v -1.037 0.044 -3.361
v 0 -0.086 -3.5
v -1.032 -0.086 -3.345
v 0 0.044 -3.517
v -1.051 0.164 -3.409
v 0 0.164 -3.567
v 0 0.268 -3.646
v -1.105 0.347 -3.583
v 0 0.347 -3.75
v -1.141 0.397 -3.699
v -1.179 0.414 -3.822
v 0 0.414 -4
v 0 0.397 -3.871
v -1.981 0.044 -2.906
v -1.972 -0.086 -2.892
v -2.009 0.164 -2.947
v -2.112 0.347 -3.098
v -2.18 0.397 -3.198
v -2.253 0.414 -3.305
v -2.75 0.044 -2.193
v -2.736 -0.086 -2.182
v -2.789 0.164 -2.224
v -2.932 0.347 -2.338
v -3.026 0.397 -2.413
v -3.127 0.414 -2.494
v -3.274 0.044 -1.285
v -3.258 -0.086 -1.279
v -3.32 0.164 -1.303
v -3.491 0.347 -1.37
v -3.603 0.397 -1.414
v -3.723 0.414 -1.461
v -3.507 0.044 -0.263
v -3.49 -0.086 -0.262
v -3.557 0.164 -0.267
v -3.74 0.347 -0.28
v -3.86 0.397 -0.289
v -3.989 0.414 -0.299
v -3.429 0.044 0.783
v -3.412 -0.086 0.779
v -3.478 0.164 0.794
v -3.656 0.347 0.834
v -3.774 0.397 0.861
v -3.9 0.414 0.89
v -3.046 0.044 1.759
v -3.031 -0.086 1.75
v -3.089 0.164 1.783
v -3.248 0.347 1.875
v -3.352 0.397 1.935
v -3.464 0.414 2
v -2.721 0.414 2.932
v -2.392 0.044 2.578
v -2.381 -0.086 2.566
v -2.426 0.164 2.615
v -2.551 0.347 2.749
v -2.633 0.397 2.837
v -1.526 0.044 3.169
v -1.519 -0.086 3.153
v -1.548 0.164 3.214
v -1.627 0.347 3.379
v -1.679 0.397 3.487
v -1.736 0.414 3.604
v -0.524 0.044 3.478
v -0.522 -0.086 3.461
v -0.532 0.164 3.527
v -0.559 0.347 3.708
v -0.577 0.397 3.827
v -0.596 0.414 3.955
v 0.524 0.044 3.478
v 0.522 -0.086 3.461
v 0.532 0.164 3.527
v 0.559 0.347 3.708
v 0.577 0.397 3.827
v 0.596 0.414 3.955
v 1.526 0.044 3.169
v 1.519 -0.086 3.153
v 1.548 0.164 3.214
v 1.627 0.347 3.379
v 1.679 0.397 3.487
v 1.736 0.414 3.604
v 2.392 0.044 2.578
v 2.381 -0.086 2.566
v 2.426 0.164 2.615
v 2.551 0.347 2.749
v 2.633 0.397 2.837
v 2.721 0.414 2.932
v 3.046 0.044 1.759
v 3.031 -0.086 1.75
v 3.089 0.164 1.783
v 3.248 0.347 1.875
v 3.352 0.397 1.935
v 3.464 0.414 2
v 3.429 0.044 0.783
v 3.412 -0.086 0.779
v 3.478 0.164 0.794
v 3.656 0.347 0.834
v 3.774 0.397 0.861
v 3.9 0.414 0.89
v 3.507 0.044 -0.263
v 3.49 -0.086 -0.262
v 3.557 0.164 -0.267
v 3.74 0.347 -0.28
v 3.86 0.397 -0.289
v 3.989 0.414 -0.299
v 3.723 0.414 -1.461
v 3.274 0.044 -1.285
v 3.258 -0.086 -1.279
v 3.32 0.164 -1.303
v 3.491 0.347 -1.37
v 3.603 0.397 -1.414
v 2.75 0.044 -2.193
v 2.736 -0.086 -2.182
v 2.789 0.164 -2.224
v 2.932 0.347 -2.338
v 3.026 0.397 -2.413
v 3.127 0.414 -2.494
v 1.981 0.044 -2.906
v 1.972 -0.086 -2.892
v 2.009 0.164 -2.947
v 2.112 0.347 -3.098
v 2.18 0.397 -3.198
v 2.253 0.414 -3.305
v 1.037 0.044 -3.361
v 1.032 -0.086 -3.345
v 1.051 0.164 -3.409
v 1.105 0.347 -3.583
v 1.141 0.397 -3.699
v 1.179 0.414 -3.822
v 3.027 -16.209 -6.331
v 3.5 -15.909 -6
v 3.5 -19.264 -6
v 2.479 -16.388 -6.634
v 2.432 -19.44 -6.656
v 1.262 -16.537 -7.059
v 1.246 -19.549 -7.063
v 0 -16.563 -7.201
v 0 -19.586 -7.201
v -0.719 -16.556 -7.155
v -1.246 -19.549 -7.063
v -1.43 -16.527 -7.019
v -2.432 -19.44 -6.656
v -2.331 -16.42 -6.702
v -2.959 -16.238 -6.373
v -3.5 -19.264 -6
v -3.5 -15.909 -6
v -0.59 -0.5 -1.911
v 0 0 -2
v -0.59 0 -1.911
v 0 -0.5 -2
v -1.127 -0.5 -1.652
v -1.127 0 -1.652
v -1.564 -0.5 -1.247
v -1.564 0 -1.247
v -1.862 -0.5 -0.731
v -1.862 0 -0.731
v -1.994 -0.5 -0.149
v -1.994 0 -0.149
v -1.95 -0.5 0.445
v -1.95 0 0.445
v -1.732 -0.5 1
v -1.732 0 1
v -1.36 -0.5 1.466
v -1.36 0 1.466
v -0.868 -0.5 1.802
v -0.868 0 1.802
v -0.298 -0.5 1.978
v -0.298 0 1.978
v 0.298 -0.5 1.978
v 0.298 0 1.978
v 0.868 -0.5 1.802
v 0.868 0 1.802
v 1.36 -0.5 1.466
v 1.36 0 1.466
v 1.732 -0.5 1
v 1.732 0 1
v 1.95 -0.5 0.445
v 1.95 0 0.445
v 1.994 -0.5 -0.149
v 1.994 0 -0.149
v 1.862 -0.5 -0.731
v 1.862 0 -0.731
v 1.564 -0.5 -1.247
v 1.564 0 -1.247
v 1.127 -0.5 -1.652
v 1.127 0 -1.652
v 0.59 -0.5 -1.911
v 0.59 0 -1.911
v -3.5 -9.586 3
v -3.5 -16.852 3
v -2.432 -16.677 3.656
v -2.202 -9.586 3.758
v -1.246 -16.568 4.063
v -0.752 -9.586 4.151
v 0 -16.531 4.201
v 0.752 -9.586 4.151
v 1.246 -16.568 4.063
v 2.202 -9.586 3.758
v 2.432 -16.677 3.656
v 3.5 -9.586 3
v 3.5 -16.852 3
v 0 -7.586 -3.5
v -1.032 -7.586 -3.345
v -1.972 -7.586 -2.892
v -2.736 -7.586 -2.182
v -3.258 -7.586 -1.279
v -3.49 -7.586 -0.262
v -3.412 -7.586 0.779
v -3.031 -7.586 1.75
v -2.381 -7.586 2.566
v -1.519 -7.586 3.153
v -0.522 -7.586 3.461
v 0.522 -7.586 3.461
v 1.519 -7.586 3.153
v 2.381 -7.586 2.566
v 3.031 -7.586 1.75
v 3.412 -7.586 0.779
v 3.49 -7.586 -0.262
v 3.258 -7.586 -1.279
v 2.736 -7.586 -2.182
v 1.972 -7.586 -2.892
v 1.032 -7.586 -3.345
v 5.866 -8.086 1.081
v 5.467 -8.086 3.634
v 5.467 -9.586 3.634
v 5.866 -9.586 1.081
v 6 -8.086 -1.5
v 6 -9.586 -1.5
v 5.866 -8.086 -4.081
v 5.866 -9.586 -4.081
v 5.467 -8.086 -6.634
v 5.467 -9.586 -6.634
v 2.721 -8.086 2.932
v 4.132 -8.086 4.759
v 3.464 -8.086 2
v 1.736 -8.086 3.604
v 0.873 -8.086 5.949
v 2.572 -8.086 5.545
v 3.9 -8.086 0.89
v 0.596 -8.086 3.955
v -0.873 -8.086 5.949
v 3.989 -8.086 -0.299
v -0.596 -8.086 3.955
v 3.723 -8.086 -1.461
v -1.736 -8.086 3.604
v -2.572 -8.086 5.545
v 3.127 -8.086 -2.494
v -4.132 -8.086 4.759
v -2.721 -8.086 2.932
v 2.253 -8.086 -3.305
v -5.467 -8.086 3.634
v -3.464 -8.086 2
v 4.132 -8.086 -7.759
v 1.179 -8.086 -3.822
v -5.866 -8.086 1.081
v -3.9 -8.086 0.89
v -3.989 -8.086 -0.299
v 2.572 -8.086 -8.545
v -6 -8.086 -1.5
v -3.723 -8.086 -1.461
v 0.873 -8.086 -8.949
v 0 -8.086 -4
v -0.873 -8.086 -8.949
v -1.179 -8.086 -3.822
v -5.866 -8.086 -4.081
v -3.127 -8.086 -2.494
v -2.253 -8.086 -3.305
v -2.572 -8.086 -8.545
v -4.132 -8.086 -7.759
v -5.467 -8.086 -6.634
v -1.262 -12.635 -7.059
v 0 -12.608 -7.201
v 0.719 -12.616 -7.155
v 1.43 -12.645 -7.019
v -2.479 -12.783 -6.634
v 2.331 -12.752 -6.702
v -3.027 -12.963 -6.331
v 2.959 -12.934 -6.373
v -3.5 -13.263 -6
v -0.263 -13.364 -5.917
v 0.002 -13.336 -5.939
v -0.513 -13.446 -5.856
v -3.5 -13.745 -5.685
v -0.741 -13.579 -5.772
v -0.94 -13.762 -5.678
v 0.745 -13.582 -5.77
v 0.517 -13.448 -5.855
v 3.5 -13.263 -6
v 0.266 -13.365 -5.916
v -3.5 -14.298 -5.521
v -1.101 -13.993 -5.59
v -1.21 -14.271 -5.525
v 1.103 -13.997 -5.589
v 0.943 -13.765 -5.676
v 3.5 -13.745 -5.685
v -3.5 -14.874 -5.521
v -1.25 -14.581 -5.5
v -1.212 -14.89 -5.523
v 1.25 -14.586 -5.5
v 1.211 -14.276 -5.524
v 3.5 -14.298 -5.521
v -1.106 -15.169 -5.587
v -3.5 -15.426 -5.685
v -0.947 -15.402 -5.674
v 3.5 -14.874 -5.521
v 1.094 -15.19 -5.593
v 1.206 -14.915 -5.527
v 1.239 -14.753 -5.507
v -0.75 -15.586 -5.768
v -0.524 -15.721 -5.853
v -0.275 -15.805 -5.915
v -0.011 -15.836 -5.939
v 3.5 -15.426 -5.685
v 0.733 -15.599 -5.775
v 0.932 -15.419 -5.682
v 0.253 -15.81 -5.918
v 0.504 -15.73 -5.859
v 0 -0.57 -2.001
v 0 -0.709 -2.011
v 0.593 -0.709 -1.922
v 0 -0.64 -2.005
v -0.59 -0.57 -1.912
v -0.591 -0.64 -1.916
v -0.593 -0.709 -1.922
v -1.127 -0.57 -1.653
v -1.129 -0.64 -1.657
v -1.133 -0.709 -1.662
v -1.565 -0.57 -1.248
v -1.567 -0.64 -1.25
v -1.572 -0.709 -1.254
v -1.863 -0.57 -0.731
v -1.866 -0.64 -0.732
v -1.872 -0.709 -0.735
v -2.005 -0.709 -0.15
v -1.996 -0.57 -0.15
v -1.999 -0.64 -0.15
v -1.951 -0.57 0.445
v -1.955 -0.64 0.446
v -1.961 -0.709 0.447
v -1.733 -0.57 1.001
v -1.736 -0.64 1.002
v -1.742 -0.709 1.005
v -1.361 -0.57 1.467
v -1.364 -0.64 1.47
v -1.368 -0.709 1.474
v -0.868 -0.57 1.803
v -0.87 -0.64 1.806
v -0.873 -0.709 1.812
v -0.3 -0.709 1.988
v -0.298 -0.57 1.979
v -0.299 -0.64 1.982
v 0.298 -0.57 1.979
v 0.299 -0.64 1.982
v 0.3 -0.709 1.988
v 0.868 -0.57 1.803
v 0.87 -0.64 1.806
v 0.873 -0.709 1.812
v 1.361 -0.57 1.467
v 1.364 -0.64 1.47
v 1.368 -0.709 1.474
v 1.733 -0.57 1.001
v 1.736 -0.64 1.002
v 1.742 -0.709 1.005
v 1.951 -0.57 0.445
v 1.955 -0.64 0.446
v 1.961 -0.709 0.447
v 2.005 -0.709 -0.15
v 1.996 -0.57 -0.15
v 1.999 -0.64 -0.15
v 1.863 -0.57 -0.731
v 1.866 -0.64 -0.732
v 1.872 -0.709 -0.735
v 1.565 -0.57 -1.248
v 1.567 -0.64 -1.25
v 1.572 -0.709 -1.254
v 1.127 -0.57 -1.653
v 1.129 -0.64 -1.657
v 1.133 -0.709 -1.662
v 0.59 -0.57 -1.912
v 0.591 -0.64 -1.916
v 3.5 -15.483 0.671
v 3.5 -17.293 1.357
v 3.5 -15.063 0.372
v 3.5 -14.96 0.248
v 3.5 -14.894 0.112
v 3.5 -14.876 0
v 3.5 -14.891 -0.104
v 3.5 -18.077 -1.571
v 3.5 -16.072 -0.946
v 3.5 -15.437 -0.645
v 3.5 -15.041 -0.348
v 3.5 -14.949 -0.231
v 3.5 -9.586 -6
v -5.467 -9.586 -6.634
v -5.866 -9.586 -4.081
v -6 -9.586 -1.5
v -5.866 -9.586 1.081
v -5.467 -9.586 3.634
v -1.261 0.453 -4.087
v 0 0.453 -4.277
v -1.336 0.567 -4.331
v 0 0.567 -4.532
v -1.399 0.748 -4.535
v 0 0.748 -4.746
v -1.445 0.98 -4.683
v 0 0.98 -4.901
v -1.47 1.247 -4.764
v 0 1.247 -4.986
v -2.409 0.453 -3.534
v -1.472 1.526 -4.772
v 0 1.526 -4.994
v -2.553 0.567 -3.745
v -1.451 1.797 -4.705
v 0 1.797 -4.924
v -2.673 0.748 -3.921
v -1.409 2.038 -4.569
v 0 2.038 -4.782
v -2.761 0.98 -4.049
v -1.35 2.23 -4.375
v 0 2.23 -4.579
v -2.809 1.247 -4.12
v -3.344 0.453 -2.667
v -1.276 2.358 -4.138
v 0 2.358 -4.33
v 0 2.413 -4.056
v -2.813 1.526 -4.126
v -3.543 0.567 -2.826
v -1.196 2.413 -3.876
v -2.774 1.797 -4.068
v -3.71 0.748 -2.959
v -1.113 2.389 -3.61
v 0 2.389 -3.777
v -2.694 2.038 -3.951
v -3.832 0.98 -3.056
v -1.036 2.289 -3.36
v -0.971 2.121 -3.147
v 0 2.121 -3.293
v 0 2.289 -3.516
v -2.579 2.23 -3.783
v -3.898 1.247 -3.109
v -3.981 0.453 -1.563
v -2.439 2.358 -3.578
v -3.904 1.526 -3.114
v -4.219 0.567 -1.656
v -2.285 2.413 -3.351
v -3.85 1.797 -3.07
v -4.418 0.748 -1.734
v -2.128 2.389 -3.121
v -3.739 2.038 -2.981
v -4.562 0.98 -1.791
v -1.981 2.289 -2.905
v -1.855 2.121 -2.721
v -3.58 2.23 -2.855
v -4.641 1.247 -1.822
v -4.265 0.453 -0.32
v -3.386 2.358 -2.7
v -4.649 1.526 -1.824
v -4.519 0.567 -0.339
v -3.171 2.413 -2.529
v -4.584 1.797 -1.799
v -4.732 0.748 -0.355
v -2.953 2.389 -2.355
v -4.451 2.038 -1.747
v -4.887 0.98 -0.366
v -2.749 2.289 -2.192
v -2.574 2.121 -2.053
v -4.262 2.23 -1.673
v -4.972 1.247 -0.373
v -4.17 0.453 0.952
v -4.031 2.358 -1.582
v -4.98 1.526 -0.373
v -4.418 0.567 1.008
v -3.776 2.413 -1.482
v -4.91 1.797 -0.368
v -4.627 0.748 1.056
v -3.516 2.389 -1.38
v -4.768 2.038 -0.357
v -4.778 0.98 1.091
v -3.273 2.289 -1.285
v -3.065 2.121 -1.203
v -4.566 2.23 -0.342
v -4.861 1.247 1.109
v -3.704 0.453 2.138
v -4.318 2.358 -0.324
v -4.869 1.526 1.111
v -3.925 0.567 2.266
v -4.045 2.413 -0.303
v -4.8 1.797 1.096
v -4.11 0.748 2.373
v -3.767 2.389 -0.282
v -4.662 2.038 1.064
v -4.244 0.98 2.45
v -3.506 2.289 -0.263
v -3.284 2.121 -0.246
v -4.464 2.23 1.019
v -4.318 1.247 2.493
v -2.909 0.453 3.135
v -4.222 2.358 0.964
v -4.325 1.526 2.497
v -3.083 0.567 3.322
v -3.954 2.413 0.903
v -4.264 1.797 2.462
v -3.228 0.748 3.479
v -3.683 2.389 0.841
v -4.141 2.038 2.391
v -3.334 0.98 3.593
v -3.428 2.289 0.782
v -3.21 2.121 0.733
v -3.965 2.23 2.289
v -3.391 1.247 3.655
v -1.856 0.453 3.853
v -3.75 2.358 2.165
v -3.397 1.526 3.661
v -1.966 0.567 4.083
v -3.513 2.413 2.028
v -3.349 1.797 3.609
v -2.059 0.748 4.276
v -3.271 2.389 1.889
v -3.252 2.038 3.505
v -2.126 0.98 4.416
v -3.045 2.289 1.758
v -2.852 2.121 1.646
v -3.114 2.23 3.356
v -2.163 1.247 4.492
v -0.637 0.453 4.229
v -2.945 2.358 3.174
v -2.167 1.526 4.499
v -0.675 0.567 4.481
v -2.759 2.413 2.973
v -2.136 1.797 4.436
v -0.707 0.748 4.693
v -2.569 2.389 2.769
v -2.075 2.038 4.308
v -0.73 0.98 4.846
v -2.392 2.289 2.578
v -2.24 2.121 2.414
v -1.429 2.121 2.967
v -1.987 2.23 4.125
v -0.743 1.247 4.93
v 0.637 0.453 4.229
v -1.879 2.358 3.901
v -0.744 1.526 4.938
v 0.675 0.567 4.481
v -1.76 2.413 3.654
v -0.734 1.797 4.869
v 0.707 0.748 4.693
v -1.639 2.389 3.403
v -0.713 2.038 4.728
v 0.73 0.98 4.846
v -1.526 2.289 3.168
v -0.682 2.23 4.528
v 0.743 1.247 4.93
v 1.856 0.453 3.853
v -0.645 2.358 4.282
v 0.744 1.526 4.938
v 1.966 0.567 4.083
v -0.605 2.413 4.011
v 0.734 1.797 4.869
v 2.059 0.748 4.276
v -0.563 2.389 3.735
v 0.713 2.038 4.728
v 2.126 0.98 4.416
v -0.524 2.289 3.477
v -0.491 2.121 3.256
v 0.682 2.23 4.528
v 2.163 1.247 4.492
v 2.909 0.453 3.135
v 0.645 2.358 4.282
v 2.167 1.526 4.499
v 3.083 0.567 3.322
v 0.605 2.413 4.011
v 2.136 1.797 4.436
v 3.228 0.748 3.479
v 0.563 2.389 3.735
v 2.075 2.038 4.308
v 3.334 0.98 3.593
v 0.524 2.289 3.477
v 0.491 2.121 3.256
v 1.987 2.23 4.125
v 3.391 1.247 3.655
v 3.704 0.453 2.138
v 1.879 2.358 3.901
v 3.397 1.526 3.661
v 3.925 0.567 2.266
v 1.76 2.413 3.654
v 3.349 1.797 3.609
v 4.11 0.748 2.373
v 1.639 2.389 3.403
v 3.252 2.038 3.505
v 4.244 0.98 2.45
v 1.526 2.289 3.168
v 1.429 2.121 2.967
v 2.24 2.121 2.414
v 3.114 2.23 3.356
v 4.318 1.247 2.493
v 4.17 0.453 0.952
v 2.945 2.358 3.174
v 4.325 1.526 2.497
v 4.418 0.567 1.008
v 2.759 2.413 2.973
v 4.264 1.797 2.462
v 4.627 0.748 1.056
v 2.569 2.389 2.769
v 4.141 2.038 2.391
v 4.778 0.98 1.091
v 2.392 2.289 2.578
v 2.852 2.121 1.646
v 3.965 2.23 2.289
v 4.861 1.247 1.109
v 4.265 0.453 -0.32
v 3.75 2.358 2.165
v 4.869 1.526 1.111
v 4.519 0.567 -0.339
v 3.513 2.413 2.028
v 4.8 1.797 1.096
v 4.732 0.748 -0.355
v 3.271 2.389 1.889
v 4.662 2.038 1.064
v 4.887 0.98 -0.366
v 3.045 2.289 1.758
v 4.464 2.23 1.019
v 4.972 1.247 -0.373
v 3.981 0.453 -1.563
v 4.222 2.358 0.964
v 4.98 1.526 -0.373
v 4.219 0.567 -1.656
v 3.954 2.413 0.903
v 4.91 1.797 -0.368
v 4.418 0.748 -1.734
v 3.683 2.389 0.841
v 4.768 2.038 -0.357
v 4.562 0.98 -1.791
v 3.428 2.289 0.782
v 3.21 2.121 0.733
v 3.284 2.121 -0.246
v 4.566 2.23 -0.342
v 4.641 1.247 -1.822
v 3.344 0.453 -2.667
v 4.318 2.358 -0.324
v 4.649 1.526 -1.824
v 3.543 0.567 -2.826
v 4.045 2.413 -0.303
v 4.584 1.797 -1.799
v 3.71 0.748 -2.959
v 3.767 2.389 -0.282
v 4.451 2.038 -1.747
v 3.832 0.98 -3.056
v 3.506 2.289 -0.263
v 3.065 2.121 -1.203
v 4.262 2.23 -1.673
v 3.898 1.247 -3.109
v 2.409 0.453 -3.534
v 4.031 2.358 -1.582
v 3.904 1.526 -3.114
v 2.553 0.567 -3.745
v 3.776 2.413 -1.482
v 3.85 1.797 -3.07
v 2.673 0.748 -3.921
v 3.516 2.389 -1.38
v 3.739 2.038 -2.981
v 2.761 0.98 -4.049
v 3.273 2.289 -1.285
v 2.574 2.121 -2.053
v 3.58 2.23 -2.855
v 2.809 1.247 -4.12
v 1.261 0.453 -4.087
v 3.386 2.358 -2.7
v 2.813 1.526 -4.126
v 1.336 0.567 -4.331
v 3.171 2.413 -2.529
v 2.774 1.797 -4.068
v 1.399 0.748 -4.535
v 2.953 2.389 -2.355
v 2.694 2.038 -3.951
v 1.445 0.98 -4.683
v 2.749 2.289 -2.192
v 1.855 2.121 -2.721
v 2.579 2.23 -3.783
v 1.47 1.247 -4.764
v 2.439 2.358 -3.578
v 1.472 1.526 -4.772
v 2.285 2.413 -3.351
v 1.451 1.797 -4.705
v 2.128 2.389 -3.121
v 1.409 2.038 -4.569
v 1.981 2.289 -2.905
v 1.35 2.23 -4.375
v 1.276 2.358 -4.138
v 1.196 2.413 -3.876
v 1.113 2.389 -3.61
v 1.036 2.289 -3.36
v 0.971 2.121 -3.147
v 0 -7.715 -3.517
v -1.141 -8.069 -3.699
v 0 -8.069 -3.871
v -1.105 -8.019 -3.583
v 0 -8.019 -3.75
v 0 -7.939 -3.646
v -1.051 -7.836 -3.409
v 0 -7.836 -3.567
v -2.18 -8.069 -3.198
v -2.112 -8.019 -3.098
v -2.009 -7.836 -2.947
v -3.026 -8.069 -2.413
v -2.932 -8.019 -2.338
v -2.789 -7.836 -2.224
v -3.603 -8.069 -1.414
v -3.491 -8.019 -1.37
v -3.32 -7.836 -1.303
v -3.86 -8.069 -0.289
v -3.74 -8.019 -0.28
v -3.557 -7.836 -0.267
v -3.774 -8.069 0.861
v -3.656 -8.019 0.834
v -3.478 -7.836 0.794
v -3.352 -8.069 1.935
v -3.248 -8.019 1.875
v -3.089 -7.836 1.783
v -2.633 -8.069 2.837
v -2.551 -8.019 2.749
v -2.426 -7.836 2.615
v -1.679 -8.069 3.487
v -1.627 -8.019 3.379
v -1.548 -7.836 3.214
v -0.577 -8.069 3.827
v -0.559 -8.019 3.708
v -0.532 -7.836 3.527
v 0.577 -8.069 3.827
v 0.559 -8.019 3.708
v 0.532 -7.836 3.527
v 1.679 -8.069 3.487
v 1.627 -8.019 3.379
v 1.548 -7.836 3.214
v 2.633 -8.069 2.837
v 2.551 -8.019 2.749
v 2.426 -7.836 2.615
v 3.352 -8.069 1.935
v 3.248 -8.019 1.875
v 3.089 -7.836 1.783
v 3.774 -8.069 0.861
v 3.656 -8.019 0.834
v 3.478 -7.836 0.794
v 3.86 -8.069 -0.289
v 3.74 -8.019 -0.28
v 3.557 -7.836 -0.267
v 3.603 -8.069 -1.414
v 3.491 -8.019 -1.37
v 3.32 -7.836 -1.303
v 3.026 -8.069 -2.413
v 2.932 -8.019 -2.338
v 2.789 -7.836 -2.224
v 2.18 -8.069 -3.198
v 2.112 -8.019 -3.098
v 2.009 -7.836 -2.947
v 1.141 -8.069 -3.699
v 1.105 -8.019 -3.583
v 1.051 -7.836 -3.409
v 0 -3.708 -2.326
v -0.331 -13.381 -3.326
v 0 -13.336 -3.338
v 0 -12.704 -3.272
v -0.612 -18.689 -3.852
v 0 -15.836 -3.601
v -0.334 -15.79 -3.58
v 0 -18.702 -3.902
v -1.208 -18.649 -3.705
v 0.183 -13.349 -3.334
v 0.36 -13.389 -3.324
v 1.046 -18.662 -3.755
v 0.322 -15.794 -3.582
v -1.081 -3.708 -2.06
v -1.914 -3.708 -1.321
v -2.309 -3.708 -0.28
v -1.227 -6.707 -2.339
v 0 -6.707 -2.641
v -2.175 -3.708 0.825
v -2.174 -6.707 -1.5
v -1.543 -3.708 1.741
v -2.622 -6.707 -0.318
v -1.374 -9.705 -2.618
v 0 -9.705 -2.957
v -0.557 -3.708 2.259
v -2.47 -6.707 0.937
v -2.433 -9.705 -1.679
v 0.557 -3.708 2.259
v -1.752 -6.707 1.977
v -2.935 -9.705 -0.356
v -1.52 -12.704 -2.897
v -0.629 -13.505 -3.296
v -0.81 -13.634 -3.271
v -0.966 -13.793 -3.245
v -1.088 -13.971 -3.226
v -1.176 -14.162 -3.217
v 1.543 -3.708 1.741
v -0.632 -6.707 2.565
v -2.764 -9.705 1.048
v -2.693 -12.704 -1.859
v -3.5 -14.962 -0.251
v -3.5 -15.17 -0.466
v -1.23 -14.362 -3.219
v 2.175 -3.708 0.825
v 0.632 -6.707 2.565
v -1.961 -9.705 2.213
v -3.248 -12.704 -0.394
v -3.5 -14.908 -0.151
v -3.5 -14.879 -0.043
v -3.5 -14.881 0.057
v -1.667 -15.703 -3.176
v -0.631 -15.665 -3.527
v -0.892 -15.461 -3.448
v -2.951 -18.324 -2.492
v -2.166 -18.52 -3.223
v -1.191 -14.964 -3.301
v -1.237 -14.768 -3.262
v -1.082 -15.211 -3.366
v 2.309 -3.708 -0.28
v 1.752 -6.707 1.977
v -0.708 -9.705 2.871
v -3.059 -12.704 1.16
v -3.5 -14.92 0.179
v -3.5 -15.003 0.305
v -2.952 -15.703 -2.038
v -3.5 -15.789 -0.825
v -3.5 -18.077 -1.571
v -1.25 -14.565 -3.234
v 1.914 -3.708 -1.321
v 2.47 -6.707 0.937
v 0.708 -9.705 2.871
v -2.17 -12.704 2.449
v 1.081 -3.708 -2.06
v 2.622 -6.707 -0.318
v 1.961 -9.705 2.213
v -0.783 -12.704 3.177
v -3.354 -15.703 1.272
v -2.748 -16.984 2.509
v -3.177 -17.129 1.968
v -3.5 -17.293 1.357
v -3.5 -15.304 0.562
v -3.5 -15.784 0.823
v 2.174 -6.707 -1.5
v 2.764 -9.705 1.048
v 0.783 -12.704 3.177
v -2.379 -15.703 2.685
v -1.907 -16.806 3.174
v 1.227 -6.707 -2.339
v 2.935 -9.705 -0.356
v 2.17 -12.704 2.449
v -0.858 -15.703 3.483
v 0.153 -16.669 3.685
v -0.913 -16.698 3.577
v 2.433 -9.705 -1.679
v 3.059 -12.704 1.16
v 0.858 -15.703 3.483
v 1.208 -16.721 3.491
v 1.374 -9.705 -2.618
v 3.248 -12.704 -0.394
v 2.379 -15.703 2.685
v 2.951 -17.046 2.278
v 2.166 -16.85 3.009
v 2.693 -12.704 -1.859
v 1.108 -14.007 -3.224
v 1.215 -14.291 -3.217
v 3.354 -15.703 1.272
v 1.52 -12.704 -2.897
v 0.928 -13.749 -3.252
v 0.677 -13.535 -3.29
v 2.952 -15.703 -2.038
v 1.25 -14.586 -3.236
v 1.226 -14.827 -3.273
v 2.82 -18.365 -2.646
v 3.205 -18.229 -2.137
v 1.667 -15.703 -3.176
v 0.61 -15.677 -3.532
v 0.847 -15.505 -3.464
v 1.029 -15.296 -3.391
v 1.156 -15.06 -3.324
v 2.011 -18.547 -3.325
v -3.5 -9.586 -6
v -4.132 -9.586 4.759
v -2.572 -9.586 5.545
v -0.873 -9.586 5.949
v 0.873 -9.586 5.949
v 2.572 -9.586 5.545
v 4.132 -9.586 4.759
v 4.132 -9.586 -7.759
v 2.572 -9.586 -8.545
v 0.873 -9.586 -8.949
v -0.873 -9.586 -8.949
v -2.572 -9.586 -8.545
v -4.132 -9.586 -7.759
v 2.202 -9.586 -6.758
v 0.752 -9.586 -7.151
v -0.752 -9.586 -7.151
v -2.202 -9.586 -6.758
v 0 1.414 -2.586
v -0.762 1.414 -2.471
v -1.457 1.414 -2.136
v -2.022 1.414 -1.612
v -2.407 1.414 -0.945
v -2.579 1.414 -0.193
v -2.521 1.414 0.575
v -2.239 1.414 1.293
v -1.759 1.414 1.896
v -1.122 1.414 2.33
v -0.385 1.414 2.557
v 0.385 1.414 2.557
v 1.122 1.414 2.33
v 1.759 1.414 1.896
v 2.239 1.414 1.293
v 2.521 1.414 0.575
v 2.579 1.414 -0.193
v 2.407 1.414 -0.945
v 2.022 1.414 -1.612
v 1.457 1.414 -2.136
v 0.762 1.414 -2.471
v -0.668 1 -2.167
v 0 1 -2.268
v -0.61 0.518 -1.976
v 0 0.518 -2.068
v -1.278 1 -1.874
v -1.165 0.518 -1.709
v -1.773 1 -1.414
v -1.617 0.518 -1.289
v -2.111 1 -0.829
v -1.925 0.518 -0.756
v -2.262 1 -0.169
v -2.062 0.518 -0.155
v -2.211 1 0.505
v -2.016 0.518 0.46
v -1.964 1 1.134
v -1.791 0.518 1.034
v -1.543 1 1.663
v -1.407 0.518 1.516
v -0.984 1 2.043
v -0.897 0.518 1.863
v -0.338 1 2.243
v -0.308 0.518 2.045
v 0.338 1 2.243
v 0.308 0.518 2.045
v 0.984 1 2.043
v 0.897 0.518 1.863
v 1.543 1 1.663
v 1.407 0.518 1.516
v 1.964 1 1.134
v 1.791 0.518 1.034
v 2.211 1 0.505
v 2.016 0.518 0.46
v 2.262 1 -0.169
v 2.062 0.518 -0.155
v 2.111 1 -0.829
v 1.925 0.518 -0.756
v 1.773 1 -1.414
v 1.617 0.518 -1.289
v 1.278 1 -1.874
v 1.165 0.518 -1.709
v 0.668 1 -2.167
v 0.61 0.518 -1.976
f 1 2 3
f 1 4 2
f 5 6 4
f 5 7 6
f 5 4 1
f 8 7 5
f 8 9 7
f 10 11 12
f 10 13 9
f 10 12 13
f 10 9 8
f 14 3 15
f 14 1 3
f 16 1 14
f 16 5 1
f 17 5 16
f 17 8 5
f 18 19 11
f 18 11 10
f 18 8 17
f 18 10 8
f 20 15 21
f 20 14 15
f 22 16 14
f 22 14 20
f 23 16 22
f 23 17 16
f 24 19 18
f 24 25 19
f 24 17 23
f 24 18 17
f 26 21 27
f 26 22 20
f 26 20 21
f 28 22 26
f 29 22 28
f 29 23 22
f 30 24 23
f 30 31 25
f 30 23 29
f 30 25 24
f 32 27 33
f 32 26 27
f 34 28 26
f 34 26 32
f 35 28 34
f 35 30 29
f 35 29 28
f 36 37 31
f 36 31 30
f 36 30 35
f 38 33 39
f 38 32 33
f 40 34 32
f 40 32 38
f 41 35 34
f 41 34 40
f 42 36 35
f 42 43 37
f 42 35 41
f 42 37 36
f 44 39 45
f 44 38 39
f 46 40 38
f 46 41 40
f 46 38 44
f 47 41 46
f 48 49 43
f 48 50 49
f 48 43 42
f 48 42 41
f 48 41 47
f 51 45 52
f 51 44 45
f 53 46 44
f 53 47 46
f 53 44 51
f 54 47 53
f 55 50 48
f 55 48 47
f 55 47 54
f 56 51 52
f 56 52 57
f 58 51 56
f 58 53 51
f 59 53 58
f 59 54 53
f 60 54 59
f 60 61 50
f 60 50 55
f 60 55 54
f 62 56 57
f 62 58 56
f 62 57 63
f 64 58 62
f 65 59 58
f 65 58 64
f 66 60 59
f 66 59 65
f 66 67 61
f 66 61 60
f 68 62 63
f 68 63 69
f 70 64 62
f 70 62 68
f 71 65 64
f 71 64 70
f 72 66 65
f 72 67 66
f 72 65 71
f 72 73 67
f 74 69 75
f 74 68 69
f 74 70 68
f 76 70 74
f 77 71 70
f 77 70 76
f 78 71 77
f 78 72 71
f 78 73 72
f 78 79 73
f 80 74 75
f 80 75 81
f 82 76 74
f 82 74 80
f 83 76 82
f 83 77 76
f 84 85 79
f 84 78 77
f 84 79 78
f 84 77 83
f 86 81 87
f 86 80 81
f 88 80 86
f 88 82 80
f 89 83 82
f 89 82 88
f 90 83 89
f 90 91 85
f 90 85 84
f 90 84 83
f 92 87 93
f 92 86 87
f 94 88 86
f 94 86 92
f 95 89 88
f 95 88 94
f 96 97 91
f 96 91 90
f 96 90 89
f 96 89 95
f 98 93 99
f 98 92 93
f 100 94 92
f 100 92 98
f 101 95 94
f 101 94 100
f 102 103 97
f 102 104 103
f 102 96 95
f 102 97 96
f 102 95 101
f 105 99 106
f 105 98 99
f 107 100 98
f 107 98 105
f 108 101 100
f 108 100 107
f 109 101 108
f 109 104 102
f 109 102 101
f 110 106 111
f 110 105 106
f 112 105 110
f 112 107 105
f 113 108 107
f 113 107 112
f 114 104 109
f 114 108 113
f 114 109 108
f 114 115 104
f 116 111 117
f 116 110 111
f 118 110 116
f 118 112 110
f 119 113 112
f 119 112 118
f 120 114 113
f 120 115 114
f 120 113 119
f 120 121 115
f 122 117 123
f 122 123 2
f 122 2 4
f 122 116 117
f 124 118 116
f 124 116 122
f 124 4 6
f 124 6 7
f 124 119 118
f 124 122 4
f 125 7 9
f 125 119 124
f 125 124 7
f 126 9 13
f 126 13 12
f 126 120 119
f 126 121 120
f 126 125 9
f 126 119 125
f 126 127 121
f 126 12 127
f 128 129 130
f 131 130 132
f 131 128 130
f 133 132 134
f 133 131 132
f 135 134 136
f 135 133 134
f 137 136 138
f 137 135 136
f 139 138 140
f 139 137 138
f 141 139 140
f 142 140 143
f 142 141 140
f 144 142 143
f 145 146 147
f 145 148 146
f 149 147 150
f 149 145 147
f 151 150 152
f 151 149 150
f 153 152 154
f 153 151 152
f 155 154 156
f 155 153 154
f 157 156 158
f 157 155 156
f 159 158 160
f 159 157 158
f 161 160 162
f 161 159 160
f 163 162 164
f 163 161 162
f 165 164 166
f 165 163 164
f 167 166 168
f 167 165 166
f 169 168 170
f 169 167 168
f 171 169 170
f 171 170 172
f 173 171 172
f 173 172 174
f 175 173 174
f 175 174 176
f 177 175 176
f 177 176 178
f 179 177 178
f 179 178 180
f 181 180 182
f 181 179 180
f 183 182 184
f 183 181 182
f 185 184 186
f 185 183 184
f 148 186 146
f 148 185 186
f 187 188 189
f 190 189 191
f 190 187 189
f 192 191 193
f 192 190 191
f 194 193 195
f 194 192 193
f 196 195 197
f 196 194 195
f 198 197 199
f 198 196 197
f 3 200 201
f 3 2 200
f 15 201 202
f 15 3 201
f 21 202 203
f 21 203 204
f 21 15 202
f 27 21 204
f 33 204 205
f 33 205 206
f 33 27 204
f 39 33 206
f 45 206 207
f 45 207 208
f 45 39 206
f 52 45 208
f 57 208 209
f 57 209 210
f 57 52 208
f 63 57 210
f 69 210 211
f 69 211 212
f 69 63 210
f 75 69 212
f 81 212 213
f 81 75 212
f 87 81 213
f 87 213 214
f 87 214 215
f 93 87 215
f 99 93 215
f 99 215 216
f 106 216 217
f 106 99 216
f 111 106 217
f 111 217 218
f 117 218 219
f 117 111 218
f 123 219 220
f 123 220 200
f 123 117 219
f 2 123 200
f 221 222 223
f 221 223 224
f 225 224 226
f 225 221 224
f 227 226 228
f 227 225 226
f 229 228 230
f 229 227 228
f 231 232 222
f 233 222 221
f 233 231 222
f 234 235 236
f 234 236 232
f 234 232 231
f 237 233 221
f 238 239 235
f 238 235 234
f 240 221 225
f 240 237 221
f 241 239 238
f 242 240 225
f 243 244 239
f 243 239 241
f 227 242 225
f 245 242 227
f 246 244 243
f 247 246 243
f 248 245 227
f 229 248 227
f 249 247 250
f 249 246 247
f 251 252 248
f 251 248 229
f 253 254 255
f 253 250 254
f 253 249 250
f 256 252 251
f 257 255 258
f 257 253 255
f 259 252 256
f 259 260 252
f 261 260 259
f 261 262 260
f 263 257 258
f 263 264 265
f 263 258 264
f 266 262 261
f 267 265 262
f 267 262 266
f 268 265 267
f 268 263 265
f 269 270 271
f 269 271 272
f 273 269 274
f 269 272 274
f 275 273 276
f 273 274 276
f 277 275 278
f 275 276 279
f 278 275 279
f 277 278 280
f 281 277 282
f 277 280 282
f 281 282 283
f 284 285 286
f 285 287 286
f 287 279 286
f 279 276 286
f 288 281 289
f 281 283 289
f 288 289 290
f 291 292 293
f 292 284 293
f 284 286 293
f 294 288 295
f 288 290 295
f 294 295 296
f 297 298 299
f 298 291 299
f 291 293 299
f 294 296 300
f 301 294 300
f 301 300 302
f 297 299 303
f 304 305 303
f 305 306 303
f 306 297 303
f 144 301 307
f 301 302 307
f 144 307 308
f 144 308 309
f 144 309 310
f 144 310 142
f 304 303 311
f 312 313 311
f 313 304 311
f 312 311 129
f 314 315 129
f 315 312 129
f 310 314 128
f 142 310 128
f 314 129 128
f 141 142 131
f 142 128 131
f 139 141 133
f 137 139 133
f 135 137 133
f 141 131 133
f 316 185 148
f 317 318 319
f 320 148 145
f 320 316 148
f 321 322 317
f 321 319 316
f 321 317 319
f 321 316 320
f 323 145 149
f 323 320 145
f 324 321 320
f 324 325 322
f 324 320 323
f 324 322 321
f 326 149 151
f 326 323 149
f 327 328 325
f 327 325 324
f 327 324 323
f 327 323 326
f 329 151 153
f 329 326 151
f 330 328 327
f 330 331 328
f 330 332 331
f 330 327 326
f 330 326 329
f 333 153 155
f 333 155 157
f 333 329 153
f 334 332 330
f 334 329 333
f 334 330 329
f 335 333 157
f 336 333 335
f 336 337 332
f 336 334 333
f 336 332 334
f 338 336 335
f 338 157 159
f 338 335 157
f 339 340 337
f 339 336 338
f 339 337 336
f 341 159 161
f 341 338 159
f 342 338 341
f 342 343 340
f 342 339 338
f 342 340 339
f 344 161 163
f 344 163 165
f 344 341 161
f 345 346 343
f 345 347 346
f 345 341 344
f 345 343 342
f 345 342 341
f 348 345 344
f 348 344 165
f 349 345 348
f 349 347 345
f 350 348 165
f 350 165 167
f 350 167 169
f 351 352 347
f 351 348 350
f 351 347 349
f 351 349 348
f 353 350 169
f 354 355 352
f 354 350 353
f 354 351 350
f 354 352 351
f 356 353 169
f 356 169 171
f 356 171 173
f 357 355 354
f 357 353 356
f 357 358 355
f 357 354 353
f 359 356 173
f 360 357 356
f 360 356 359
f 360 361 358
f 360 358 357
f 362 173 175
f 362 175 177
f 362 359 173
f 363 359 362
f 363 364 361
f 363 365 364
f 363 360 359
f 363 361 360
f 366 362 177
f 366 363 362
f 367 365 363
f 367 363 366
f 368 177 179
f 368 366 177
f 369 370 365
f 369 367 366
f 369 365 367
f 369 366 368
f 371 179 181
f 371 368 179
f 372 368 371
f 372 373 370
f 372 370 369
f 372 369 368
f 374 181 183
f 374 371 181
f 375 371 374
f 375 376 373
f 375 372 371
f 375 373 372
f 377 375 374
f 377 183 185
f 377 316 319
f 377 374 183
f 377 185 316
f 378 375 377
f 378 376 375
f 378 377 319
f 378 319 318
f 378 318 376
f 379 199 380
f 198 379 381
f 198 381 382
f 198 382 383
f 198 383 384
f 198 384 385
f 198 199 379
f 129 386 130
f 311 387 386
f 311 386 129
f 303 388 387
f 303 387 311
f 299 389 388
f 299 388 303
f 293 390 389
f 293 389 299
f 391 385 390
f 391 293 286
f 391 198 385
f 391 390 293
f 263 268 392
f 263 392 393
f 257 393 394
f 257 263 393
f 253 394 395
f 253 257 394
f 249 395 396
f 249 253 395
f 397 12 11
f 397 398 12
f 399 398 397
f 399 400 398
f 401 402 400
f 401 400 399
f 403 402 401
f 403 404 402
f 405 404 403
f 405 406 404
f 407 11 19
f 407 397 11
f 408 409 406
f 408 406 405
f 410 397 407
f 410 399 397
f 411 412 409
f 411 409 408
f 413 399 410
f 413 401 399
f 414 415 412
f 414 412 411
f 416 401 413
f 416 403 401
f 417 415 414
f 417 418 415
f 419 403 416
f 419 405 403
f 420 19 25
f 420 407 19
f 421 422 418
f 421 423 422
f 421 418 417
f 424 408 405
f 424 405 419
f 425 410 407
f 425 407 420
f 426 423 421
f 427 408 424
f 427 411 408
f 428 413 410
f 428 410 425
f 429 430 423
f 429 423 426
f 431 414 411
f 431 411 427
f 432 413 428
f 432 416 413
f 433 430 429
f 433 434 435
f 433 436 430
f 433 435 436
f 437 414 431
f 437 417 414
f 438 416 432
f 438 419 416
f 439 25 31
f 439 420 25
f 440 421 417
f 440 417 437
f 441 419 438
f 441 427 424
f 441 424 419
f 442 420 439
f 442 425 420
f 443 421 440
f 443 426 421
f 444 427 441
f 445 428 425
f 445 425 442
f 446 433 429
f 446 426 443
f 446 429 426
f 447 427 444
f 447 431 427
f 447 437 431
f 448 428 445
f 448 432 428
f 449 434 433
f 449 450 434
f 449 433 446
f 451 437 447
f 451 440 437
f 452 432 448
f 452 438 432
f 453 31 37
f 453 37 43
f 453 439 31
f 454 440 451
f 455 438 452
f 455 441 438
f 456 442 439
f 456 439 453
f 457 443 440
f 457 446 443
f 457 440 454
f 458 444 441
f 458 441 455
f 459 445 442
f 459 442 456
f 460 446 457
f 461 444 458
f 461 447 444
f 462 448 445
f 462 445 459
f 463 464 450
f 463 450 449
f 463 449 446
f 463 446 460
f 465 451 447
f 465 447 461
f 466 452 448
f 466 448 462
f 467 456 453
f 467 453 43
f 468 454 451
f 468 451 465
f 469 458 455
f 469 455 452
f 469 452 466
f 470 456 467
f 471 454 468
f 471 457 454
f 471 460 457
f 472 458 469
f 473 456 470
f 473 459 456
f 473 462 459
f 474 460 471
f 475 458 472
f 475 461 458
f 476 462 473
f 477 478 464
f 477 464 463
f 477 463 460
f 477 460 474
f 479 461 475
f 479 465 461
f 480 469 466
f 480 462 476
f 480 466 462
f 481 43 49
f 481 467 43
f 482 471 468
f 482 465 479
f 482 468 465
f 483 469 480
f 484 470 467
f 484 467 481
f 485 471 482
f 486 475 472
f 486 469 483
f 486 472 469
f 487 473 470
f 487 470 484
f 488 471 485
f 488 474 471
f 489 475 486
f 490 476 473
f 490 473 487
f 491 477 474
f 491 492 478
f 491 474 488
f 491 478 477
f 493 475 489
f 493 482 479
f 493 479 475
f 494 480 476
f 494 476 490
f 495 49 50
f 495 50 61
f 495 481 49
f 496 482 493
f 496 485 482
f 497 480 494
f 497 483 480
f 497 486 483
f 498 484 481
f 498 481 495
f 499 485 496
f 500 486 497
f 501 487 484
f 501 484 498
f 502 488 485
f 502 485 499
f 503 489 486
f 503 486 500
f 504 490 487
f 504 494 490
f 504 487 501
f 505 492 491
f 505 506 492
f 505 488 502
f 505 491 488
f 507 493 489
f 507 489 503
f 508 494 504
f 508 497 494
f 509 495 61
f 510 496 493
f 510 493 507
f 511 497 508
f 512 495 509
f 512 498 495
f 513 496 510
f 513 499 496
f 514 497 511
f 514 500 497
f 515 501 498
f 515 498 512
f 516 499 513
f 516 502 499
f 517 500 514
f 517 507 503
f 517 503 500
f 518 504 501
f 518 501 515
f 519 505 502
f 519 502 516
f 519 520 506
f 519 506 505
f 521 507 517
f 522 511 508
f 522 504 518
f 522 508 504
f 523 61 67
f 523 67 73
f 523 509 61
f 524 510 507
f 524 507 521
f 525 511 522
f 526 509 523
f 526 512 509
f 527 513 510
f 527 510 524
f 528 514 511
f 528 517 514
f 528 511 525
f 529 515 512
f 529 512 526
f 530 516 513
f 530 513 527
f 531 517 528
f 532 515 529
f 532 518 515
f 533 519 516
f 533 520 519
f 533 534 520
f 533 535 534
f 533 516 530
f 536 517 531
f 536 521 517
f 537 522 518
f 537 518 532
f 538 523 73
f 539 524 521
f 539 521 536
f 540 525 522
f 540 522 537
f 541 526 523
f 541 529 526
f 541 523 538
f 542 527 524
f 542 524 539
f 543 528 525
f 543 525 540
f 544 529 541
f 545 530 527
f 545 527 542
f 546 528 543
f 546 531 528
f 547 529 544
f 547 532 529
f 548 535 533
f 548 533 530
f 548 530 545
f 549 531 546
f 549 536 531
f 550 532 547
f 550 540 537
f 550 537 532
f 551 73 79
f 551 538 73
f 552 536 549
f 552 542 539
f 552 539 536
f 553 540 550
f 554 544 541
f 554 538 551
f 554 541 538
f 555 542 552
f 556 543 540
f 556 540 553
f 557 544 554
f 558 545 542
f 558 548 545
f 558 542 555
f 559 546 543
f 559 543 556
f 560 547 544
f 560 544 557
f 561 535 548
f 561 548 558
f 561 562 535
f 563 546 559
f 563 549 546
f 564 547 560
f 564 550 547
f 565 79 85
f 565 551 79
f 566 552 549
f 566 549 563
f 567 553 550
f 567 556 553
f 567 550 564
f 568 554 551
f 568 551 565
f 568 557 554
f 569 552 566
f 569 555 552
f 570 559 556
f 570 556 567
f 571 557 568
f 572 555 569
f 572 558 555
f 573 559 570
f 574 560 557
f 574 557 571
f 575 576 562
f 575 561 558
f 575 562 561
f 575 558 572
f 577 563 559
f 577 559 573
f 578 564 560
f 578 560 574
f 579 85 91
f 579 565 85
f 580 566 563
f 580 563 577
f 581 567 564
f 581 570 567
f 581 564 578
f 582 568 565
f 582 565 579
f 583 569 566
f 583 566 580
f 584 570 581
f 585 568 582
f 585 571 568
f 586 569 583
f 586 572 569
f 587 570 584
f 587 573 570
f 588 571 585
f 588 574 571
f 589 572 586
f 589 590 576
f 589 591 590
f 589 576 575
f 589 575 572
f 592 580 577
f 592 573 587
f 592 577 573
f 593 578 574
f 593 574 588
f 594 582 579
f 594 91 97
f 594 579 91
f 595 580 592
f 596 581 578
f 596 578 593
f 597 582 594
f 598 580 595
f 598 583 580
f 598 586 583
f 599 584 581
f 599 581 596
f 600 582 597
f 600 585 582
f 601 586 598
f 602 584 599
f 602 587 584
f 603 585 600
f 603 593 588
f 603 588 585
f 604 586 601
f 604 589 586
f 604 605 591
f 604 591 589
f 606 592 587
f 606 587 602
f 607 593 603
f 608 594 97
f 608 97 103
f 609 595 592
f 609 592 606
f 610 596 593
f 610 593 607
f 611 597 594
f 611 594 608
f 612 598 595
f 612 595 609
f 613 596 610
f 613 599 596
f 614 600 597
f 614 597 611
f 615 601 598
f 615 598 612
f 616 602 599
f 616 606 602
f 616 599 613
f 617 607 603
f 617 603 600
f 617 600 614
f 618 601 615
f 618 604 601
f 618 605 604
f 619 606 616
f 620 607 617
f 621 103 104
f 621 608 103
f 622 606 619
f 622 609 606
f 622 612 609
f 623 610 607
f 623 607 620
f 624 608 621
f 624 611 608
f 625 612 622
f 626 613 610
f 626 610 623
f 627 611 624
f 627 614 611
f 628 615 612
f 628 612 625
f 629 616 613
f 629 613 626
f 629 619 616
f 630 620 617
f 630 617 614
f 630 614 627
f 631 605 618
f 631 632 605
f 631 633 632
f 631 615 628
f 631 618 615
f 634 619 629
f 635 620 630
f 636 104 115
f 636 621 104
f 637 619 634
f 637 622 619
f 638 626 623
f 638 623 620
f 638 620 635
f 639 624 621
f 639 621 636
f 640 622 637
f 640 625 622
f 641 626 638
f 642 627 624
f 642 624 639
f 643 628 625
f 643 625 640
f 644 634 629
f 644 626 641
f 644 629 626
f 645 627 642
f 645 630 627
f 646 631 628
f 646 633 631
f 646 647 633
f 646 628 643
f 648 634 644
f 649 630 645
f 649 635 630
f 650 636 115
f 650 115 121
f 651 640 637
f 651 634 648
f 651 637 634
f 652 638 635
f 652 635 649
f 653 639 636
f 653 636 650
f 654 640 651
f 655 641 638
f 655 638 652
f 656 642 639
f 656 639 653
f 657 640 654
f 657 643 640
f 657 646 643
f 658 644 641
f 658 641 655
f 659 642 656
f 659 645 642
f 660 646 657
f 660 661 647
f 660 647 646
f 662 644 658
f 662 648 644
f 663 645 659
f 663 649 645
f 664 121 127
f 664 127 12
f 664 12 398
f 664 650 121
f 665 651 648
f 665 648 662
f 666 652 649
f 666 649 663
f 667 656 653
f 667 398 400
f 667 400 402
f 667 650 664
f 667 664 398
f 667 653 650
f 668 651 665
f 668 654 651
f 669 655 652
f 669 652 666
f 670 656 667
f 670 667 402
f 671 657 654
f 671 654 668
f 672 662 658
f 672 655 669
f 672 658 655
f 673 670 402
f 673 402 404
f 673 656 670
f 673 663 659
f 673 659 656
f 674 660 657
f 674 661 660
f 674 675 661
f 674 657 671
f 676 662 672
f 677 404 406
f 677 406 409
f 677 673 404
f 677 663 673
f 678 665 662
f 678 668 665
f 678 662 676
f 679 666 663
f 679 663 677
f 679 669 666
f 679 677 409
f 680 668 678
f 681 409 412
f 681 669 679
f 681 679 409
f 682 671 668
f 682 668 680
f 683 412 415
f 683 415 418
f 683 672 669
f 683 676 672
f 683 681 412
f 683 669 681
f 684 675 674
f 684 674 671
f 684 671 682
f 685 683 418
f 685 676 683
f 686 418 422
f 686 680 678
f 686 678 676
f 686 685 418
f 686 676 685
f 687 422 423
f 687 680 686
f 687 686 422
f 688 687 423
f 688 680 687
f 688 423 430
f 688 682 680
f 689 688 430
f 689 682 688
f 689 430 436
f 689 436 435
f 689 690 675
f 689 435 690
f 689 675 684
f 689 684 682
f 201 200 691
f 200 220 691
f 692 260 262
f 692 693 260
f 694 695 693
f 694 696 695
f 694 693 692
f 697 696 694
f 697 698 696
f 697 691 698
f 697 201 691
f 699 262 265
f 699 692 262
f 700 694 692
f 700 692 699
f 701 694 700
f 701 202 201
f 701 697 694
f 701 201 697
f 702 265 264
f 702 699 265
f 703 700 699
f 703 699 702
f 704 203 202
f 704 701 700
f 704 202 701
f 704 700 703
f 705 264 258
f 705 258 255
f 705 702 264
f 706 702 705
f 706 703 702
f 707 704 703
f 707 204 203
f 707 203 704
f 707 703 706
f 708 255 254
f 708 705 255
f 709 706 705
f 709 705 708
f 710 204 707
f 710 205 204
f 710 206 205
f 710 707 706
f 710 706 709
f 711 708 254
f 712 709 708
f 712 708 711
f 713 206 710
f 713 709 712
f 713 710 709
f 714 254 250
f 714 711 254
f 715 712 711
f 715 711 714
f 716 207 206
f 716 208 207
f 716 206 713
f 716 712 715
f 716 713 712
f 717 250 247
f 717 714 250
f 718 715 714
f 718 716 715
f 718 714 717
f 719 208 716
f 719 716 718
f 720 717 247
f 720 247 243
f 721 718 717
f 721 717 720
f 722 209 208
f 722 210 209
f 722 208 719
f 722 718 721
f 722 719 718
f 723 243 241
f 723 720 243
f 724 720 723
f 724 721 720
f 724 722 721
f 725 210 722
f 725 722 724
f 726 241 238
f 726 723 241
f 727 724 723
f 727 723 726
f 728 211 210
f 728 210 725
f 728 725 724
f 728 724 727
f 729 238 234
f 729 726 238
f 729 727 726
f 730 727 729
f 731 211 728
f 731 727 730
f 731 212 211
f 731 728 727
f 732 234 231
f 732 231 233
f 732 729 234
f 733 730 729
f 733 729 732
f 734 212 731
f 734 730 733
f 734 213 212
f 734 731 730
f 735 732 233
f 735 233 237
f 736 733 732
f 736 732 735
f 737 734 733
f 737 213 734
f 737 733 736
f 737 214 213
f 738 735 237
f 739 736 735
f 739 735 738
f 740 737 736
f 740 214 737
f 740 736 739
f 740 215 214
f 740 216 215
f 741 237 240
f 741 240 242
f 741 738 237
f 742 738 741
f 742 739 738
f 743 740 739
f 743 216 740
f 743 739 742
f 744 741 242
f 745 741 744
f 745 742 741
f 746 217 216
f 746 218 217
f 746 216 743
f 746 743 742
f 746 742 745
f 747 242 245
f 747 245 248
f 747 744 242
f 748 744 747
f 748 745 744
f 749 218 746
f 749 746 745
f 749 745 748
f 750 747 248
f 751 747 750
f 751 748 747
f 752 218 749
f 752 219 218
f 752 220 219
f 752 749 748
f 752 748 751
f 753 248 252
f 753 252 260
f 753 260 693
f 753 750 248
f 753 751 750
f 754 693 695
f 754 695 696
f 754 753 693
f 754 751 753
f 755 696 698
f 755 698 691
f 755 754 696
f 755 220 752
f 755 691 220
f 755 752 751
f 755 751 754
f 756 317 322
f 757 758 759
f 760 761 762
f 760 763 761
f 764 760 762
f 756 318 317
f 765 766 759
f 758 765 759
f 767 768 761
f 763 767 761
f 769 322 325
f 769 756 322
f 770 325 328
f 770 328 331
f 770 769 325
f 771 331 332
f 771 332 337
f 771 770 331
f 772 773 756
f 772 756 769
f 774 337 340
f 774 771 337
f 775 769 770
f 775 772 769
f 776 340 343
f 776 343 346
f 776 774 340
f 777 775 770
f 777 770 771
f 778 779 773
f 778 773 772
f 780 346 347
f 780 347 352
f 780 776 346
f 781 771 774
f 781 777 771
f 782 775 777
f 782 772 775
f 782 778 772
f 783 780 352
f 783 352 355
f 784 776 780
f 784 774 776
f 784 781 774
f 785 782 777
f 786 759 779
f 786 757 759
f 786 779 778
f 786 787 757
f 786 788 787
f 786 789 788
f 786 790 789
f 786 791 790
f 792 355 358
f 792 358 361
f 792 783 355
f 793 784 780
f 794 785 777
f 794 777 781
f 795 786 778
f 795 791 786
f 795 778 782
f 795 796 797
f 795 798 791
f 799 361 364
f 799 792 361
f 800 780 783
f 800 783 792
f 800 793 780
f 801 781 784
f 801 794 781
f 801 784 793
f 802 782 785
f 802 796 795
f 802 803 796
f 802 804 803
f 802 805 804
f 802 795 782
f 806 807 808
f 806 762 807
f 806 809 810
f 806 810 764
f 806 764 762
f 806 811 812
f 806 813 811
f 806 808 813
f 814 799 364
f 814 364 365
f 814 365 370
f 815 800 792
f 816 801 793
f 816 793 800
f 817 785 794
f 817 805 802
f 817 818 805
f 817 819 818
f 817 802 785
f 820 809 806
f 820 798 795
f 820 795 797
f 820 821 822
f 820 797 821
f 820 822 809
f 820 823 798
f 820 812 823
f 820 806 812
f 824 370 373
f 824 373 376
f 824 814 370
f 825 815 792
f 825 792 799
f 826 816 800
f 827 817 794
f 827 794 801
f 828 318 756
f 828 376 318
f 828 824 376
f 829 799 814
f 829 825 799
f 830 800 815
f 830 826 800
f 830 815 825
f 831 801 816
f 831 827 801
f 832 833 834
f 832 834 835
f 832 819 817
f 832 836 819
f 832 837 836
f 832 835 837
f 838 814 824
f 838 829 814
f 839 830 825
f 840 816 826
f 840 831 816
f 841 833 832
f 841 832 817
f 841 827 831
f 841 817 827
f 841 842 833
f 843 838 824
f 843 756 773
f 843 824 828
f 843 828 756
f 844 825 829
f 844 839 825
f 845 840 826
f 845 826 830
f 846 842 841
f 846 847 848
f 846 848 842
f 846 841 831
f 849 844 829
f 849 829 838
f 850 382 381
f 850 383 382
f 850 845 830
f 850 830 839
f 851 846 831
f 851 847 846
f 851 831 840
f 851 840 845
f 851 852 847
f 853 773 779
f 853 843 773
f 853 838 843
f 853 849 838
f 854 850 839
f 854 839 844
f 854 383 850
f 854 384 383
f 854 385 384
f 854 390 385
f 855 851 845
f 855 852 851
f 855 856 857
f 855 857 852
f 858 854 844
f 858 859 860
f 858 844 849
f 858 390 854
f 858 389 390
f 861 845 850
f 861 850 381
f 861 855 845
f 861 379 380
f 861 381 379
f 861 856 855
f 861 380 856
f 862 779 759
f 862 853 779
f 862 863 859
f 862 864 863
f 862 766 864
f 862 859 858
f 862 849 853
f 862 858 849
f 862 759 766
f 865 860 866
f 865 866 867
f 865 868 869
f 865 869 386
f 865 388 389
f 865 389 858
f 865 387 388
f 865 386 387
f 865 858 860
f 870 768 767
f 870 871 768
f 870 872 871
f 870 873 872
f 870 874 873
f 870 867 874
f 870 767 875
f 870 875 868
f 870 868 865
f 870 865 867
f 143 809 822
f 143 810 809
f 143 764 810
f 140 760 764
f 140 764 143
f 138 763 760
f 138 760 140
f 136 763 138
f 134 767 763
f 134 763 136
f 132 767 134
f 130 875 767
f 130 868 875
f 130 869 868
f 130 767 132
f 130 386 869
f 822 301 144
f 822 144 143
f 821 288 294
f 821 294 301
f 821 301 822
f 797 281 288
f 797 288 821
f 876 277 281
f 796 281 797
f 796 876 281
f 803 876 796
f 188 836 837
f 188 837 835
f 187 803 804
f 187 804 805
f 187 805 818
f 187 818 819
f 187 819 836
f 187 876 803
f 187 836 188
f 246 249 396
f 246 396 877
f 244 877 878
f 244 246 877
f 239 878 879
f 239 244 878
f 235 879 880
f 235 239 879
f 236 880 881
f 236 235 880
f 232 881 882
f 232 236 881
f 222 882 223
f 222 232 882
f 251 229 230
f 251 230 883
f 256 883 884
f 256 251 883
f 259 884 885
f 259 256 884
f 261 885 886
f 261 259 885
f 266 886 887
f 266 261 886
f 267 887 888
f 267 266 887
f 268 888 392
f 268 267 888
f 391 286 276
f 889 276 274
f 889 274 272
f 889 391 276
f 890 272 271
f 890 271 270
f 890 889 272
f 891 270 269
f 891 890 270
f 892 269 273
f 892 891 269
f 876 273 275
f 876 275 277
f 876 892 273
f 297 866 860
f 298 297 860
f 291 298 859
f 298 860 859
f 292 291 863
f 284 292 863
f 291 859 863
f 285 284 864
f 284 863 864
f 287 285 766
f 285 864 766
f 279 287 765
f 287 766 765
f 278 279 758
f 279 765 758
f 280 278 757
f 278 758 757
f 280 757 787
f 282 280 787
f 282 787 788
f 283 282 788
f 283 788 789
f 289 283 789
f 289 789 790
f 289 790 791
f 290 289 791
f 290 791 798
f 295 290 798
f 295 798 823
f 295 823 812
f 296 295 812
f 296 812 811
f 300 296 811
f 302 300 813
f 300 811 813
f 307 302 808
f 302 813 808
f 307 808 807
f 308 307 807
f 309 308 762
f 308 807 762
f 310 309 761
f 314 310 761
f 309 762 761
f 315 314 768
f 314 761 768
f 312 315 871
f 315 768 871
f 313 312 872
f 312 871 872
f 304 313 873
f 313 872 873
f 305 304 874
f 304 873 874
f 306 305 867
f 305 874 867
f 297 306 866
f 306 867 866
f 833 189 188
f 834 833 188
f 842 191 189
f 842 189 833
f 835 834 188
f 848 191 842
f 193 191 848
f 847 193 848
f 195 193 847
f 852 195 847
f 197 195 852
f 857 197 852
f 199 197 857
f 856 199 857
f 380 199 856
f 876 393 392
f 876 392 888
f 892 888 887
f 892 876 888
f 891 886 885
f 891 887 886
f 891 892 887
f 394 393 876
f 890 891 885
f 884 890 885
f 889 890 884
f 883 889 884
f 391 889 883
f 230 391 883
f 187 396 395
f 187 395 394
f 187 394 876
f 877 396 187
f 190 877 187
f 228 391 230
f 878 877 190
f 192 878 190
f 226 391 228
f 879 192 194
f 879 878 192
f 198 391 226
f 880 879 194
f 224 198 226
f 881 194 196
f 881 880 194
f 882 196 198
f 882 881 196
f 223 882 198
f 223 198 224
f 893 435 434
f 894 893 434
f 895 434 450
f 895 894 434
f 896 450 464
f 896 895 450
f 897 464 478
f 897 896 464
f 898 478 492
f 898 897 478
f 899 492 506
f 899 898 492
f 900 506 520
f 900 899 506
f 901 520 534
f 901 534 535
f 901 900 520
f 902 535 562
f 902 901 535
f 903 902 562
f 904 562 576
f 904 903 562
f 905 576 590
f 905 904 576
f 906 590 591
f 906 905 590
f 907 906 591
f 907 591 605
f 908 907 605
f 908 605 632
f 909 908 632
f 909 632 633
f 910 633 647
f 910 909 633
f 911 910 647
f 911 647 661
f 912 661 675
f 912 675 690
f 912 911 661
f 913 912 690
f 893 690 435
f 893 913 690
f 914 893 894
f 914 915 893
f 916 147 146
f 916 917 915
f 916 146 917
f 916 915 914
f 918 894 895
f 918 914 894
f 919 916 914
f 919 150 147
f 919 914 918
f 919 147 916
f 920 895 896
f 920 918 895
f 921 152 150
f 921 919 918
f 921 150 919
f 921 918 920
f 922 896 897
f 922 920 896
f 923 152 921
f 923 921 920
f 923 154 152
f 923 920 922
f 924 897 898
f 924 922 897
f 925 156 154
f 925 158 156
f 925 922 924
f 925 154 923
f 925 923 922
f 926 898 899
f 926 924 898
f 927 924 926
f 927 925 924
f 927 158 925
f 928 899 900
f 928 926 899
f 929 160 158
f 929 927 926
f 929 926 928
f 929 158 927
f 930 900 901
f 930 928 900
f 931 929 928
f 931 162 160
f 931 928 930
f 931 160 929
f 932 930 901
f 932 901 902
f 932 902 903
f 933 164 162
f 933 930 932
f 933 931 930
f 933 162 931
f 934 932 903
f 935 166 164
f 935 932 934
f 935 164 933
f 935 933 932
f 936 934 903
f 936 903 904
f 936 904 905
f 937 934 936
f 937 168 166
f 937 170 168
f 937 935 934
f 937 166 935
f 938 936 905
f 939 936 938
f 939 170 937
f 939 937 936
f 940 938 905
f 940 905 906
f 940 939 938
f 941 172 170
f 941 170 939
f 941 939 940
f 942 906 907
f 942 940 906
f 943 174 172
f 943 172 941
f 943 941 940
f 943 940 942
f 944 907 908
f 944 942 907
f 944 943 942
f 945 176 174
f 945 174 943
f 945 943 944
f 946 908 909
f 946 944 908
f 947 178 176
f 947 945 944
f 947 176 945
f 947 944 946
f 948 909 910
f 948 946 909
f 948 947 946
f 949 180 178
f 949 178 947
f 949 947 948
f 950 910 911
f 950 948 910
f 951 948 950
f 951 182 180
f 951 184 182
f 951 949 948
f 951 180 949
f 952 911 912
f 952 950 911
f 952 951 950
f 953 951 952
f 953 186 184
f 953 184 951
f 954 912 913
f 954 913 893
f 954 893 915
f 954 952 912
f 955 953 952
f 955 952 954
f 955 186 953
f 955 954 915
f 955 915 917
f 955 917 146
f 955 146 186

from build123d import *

# Parameters (mm, degrees)
SKETCH2_OUTSIDE_W  = 29.166
SKETCH2_OUTSIDE_H  = 29.166
CUT_EXTRUDE1_DEPTH = 12.5
SKETCH3_OUTSIDE_W  = 19.842
SKETCH3_OUTSIDE_H  = 22.842
CUT_EXTRUDE2_DEPTH = 11
SKETCH4_R          = 2
CUT_EXTRUDE3_DEPTH = 5
SKETCH5_R          = 1.25
CUT_EXTRUDE4_DEPTH = 10


with BuildPart() as part:
    # Sketch1 → Revolve1 (revolve)
    with BuildSketch(Plane.XY, mode=Mode.PRIVATE) as revolve1_sk:
        with BuildLine():
            Line((2, 0), (2, -0.5))
            ThreePointArc((2, -0.5), (2.00274093, -0.604671912), (2.010956209, -0.709056927))
            Line((2.010956209, -0.709056927), (3.994980429, -19.585786438))
            Line((3.994980429, -19.585786438), (8, -19.585786438))
            Line((8, -19.585786438), (8, -9.585786438))
            Line((8, -9.585786438), (10, -9.585786438))
            Line((10, -9.585786438), (10, -8.085786438))
            Line((10, -8.085786438), (4, -8.085786438))
            ThreePointArc((4, -8.085786438), (3.646446609, -7.939339828), (3.5, -7.585786438))
            Line((3.5, -7.585786438), (3.5, -0.085786438))
            ThreePointArc((3.5, -0.085786438), (3.646446609, 0.267766953), (4, 0.414213562))
            ThreePointArc((4, 0.414213562), (4.923879533, 1.796896995), (3.292893219, 2.121320344))
            Line((3.292893219, 2.121320344), (2.585786438, 1.414213562))
            ThreePointArc((2.585786438, 1.414213562), (2.152240935, 0.765366865), (2, 0))
        make_face()
    revolve(revolve1_sk.sketch.rotate(Axis((0, -19.635786438, 0), (0, 1, 0)), 90), axis=Axis((0, -19.635786438, 0), (0, 1, 0)))  # turned: the seam where the file's is

    # Sketch2 outside → Cut-Extrude1 (cut, through all)
    with BuildSketch(Plane(origin=(0, -8.085786438, 0), x_dir=(-1, 0, 0), z_dir=(0, 1, 0))):
        Rectangle(SKETCH2_OUTSIDE_W, SKETCH2_OUTSIDE_H)
        with BuildLine():
            ThreePointArc((5.467105263, 3.634273078), (0, 6), (-5.467105263, 3.634273078))
            ThreePointArc((-5.467105263, 3.634273078), (-6, -1.5), (-5.467105263, -6.634273078))
            ThreePointArc((-5.467105263, -6.634273078), (0, -9), (5.467105263, -6.634273078))
            ThreePointArc((5.467105263, -6.634273078), (6, -1.5), (5.467105263, 3.634273078))
        make_face(mode=Mode.SUBTRACT)
    extrude(amount=-CUT_EXTRUDE1_DEPTH, mode=Mode.SUBTRACT)

    # Sketch3 outside → Cut-Extrude2 (cut, through all)
    with BuildSketch(Plane.XZ.offset(9.585786438)):
        with Locations((0, -1.5)):
            Rectangle(SKETCH3_OUTSIDE_W, SKETCH3_OUTSIDE_H)
        with BuildLine():
            Line((-3.5, -6), (-3.5, 3))
            ThreePointArc((-3.5, 3), (0, 4.200877125), (3.5, 3))
            Line((3.5, 3), (3.5, -6))
            ThreePointArc((3.5, -6), (0, -7.200877125), (-3.5, -6))
        make_face(mode=Mode.SUBTRACT)
    extrude(amount=CUT_EXTRUDE2_DEPTH, mode=Mode.SUBTRACT)

    # Sketch4 → Cut-Extrude3 (cut, symmetric)
    with BuildSketch(Plane(origin=(0, 0, 0), x_dir=(0, 0, -1), z_dir=(1, 0, 0))):
        with Locations((7.5, -14.585786438)):
            Circle(SKETCH4_R)
        Polygon((-4.200877125, -16.530695594), (7.200877125, -19.585786438), (-4.200877125, -19.585786438), align=None)
    extrude(amount=CUT_EXTRUDE3_DEPTH, both=True, mode=Mode.SUBTRACT)

    # Sketch5 → Cut-Extrude4 (cut, through all)
    with BuildSketch(Plane.XY):
        with Locations((0, -14.585786438)):
            Circle(SKETCH5_R)
    extrude(amount=-CUT_EXTRUDE4_DEPTH, mode=Mode.SUBTRACT)


solid = part.part
